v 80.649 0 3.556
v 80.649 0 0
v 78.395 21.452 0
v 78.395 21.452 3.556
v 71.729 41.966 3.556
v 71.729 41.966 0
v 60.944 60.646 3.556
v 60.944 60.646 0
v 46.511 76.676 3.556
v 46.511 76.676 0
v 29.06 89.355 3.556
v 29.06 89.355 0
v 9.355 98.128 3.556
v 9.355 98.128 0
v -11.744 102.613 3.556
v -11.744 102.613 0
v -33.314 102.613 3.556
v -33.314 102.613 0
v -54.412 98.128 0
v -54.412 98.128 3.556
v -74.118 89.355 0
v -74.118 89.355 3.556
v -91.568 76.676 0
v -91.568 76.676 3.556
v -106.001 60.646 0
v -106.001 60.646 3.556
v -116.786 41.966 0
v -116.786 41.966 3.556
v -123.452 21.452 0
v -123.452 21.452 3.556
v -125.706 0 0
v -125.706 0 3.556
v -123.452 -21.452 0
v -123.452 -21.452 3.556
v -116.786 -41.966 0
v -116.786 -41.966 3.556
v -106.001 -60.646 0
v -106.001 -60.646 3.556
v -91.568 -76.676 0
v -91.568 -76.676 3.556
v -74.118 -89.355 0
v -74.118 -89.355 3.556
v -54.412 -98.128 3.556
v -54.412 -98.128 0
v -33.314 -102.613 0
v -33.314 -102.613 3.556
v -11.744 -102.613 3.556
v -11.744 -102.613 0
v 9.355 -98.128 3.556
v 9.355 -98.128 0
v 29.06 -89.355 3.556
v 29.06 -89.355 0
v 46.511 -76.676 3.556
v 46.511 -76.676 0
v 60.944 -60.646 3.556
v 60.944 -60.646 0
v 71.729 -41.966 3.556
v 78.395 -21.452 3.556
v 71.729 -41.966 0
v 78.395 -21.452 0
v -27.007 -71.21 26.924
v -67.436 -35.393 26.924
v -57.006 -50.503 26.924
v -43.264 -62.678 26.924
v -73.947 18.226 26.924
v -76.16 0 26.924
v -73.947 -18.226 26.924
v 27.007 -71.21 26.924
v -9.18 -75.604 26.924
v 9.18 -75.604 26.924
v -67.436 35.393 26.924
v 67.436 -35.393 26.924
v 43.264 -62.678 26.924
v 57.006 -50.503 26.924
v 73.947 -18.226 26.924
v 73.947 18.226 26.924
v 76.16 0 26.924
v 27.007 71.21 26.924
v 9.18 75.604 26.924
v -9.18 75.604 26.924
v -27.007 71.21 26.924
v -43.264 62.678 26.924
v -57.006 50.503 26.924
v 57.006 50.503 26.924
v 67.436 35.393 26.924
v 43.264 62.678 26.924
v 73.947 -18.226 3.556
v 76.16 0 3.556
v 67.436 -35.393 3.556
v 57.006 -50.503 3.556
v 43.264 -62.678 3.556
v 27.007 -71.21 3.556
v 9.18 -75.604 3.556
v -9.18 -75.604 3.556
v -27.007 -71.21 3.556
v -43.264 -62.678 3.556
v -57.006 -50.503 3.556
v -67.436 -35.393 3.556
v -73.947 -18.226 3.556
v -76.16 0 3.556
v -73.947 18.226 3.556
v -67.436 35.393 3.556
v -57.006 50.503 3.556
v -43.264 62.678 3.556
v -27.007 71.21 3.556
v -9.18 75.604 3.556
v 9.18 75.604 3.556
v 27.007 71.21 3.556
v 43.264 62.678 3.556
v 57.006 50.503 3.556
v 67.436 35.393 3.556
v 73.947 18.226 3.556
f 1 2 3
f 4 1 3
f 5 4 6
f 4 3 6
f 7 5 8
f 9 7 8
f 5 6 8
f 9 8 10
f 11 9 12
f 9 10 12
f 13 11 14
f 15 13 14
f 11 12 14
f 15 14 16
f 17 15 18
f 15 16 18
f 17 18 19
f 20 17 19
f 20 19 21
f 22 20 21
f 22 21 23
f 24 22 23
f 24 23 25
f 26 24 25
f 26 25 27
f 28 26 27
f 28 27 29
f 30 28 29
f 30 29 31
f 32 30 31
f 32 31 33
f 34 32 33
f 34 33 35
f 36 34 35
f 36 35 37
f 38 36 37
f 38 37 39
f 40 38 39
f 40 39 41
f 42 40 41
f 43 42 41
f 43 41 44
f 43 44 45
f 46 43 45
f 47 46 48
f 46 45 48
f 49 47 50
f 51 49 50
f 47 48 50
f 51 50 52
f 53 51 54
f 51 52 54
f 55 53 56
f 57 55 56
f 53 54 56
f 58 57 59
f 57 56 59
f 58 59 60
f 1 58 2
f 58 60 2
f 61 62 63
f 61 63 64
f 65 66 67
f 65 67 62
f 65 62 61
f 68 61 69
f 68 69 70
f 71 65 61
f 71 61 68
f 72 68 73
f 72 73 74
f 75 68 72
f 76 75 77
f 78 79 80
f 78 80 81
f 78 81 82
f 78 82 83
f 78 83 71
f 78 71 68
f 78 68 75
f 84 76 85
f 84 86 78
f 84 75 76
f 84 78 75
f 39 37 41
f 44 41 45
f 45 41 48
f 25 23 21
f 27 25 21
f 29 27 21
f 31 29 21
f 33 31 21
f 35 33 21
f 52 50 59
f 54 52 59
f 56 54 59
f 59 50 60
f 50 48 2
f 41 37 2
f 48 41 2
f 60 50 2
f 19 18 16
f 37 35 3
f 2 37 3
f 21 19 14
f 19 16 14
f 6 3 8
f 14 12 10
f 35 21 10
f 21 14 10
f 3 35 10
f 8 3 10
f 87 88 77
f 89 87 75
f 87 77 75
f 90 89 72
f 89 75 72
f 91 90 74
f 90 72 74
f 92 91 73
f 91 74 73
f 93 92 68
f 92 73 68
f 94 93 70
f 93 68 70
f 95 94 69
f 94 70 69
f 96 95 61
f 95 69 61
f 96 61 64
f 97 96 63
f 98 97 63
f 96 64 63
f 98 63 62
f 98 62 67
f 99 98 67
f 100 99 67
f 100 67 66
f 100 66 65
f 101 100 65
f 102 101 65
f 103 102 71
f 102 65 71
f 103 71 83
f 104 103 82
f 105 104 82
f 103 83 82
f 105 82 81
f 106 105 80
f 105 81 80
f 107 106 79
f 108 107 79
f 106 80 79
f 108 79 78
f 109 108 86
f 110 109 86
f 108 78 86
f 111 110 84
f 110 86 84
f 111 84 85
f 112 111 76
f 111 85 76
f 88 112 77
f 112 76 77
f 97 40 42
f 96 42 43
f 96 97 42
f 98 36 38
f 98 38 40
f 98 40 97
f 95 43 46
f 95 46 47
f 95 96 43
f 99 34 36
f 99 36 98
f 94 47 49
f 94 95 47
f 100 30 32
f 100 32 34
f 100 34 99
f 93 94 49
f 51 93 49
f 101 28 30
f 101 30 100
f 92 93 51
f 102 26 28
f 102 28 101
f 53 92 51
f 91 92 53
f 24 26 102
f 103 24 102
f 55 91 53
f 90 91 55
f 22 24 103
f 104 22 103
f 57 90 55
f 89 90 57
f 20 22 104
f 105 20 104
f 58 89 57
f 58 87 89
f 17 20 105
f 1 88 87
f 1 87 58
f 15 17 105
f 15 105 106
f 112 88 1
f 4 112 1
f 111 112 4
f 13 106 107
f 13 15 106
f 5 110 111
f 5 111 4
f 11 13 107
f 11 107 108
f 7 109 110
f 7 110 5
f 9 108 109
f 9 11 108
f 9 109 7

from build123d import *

# Parameters (mm, degrees)
F0_R     = 76.159602451
F1_DEPTH = 26.924
F2_R     = 103.1779531524
F3_DEPTH = 25.4
F4_DEPTH = 21.844


with BuildPart() as f1:
    # F0 (on Top) → F1 (new body)
    with BuildSketch(Plane.XY):
        Circle(F0_R)
    extrude(amount=F1_DEPTH)

    # F2 (on Top) → F3 (join)
    with BuildSketch(Plane.XY):
        with Locations((-22.5285384804, 0)):
            Circle(F2_R)
    extrude(amount=F3_DEPTH)

    # F4 (cut): a face of the model
    f4_faces = [f1.faces().sort_by_distance(p)[0] for p in [
        (-122.7881784191, 0, 25.4),
    ]]
    extrude(f4_faces, amount=-F4_DEPTH, mode=Mode.SUBTRACT)


solid = f1.part
